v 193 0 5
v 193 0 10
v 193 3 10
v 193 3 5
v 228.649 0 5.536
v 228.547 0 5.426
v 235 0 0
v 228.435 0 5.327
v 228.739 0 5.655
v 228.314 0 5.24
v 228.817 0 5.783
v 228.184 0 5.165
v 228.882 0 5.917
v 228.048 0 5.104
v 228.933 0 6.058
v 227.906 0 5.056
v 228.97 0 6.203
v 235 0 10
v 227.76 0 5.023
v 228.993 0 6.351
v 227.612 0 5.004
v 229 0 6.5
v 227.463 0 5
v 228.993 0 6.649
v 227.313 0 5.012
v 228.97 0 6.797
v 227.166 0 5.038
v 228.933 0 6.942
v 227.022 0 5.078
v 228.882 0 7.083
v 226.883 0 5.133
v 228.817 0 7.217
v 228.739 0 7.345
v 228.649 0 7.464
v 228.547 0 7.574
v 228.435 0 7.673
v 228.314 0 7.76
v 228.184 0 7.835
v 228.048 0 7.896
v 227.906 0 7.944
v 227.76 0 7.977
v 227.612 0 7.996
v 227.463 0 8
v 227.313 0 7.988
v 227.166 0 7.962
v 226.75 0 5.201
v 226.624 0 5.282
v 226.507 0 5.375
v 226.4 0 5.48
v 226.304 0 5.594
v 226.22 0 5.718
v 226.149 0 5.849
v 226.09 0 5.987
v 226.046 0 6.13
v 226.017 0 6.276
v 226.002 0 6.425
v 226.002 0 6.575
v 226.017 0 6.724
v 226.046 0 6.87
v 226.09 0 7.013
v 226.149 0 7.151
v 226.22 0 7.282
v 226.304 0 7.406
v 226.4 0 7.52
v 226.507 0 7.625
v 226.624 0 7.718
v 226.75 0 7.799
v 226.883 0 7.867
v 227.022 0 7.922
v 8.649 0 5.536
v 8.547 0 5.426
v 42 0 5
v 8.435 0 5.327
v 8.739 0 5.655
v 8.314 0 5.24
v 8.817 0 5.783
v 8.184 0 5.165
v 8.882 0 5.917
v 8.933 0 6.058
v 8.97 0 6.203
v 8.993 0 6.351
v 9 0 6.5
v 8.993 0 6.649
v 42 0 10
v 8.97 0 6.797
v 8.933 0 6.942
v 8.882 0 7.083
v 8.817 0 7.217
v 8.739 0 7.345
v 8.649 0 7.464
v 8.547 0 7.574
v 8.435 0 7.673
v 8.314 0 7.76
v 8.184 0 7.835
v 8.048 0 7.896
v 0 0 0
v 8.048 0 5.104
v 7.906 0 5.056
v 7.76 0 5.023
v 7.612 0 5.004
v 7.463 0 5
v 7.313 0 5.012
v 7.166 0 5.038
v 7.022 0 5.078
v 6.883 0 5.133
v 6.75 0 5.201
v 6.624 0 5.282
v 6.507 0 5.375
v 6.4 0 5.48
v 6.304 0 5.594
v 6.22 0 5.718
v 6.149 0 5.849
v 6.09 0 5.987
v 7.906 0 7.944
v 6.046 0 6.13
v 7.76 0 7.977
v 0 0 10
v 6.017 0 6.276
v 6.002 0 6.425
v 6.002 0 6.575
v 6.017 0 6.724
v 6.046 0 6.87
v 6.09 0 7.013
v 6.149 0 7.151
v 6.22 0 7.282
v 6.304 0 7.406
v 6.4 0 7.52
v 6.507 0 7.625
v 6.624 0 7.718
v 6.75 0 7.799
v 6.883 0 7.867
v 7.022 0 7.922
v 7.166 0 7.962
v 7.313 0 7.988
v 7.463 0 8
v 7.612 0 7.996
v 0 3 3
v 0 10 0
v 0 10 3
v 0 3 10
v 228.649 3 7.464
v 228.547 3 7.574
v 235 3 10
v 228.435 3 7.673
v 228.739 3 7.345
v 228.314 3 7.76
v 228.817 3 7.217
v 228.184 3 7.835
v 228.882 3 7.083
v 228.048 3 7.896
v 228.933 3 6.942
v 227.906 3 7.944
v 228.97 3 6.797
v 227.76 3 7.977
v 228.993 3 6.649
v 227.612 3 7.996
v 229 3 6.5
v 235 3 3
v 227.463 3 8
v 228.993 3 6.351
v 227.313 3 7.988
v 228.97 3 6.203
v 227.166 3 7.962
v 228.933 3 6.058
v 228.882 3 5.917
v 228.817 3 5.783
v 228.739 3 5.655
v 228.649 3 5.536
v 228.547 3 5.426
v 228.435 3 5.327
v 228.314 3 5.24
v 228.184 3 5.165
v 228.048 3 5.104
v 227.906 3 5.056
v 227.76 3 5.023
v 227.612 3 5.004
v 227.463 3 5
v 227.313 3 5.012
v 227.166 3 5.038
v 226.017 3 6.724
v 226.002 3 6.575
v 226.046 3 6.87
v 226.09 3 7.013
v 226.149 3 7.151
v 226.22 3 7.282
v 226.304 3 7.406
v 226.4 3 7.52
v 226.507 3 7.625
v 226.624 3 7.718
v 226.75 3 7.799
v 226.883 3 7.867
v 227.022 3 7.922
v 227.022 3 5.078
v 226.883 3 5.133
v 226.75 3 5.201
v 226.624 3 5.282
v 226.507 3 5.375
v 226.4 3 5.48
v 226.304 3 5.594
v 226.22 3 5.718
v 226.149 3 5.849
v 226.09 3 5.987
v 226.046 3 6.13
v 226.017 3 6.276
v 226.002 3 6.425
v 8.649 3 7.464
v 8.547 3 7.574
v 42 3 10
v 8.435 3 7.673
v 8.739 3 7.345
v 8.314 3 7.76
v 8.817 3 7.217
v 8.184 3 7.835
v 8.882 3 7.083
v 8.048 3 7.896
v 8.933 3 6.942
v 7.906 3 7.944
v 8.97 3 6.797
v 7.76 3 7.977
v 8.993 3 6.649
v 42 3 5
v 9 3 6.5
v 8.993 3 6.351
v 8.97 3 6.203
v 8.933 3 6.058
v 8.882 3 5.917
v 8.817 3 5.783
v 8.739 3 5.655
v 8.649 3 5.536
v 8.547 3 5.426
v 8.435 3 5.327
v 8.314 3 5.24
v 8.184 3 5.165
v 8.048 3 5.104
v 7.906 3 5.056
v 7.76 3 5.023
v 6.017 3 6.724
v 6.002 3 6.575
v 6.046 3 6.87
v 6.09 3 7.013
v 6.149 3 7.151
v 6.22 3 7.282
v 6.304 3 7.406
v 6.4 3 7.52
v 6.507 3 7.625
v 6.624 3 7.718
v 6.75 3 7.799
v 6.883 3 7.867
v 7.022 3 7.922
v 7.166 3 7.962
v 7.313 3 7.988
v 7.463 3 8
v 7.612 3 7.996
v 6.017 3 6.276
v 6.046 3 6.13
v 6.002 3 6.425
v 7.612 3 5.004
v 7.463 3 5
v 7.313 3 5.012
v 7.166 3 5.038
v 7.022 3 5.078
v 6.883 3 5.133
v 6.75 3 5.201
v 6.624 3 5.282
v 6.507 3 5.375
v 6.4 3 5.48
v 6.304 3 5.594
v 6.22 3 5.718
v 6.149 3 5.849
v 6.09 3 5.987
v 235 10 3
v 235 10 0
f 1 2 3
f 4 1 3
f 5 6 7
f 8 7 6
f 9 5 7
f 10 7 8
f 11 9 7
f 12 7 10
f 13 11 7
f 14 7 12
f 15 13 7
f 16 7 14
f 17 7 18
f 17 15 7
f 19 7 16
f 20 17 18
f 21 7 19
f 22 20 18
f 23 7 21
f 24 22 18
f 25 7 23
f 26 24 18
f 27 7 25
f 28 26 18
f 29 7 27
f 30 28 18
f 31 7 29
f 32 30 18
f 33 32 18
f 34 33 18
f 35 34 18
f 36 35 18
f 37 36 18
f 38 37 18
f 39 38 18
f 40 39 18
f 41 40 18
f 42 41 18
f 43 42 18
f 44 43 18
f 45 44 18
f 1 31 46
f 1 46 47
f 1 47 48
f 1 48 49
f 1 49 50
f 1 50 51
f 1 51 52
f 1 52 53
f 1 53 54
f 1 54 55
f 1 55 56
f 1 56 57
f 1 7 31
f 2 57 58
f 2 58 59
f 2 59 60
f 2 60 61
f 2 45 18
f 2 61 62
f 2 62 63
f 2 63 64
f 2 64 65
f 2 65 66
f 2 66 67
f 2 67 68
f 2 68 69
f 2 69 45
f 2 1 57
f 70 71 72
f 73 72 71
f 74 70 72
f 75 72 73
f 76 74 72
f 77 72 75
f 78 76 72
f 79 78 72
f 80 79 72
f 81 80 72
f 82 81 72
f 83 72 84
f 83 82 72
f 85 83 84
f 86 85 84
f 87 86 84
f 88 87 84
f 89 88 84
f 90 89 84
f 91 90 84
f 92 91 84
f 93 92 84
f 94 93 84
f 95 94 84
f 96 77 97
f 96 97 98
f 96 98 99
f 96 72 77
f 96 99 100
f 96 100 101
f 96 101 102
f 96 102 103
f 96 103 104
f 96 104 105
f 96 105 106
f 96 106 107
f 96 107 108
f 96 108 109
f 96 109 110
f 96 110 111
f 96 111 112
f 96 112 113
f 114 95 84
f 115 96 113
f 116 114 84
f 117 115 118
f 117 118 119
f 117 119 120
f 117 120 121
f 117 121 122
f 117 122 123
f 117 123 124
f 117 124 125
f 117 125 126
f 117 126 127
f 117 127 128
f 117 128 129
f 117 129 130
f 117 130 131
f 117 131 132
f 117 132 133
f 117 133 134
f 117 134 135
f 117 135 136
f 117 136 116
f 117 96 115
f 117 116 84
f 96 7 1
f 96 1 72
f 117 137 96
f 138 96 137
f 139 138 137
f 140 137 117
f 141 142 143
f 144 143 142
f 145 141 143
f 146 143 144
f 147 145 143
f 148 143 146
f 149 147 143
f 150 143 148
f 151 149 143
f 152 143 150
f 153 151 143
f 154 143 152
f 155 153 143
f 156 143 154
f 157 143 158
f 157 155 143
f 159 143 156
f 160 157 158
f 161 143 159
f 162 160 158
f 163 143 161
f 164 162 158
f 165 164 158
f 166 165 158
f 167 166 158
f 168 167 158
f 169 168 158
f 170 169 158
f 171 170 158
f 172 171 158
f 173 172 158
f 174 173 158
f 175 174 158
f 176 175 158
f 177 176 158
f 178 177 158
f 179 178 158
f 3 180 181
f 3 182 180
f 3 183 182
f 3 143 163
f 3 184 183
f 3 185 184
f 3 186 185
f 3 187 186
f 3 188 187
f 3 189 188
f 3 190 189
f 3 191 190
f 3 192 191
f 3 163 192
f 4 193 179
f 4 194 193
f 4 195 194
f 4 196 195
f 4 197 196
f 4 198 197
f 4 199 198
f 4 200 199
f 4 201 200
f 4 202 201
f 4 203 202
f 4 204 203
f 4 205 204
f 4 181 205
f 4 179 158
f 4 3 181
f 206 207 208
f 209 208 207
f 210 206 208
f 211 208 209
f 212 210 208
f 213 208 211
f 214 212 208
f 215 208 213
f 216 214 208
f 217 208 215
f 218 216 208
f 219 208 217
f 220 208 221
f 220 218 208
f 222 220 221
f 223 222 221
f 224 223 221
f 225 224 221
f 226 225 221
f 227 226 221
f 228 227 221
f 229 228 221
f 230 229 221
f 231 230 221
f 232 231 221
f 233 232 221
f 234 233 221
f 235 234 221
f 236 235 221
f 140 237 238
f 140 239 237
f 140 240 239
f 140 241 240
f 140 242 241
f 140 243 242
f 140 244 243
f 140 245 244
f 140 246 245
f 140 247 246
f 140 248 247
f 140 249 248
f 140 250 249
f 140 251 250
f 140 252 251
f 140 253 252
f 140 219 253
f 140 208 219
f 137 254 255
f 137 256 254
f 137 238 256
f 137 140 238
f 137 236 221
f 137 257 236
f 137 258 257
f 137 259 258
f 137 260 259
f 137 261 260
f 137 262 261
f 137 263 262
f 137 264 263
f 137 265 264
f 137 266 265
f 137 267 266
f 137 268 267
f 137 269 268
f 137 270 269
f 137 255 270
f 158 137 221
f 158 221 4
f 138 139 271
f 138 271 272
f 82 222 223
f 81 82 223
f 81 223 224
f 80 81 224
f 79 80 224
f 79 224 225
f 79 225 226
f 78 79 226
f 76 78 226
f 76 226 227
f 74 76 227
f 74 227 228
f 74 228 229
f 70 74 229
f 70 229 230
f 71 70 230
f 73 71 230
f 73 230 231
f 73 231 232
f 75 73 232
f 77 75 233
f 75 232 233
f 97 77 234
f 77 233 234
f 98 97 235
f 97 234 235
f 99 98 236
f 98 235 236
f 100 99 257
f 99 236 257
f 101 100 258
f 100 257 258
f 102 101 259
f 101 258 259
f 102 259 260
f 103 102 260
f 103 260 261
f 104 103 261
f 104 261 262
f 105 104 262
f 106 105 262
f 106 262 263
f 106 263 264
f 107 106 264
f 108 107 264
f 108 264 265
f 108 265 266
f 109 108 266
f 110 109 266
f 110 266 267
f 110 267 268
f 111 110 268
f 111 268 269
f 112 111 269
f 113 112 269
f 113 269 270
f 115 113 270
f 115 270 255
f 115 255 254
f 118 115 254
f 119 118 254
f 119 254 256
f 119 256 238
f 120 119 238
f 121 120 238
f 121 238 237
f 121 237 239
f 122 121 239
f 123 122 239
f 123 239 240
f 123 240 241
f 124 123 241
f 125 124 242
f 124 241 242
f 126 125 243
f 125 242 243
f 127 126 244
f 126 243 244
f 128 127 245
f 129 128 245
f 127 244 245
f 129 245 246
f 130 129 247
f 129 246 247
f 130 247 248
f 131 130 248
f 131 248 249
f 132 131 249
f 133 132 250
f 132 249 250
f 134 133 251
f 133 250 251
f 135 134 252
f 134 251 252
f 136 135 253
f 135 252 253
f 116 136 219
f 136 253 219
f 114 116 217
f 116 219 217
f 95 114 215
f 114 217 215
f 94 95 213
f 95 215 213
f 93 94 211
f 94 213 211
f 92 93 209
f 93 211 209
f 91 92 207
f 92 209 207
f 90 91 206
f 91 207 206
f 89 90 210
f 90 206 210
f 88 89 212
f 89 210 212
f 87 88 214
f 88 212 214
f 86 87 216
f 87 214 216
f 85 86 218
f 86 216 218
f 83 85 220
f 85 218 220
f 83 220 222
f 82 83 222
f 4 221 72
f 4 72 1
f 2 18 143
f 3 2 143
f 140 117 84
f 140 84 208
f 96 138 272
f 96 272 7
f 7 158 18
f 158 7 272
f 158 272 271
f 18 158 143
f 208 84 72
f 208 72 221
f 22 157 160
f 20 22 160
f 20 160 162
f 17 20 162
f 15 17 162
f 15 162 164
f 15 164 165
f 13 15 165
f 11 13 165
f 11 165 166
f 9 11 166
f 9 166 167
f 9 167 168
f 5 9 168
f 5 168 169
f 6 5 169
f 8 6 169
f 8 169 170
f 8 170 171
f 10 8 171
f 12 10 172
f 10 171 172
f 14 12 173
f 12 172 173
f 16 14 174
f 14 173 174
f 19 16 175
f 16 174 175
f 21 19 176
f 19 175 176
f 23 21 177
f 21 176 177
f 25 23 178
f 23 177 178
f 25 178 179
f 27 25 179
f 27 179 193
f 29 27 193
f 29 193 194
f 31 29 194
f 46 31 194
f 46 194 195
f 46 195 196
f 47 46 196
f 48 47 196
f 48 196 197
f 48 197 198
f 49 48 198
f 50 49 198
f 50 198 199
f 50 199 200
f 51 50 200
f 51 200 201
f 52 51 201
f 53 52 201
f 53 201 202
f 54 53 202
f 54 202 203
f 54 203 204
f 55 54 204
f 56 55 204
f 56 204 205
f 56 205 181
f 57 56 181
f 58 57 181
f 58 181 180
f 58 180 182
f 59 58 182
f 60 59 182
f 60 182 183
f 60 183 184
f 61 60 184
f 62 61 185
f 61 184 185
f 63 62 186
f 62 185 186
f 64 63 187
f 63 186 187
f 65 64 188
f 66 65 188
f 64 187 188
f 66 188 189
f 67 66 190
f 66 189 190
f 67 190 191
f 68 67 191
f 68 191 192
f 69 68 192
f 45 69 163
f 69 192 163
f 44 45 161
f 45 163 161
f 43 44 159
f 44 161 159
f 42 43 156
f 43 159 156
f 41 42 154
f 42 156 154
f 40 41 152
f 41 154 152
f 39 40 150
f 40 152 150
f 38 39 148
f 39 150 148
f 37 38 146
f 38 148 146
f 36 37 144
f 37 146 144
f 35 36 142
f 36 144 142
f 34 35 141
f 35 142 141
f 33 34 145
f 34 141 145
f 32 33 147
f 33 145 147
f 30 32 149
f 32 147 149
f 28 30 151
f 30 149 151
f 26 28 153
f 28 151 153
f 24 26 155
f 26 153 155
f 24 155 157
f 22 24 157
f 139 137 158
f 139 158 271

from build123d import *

# Parameters (mm, degrees)
EXTRUDE_1_DEPTH     = 235
SKETCH_3_R          = 1.5
CUT_EXTRUDE_1_DEPTH = 10
SKETCH_4_W          = 151
SKETCH_4_H          = 3
CUT_EXTRUDE_2_DEPTH = 5


with BuildPart() as part:
    # Эскиз1 → Бобышка-Вытянуть1 (new body)
    with BuildSketch(Plane(origin=(0, 0, 0), x_dir=(0, 0, -1), z_dir=(1, 0, 0))):
        Polygon((0, 0), (-10, 0), (-10, 3), (-3, 3), (-3, 10), (0, 10), align=None)
    extrude(amount=EXTRUDE_1_DEPTH)

    # Эскиз3 → Вырез-Вытянуть1 (cut)
    with BuildSketch(Plane(origin=(0, 3, 0), x_dir=(1, 0, 0), z_dir=(0, 1, 0))):
        with Locations((7.5, -6.5)):
            Circle(SKETCH_3_R)
        with Locations((227.5, -6.5)):
            Circle(SKETCH_3_R)
    extrude(amount=-CUT_EXTRUDE_1_DEPTH, mode=Mode.SUBTRACT)

    # Эскиз4 → Вырез-Вытянуть2 (cut)
    with BuildSketch(Plane.XY.offset(10)):
        with Locations((117.5, 1.5)):
            Rectangle(SKETCH_4_W, SKETCH_4_H)
    extrude(amount=-CUT_EXTRUDE_2_DEPTH, mode=Mode.SUBTRACT)


solid = part.part
